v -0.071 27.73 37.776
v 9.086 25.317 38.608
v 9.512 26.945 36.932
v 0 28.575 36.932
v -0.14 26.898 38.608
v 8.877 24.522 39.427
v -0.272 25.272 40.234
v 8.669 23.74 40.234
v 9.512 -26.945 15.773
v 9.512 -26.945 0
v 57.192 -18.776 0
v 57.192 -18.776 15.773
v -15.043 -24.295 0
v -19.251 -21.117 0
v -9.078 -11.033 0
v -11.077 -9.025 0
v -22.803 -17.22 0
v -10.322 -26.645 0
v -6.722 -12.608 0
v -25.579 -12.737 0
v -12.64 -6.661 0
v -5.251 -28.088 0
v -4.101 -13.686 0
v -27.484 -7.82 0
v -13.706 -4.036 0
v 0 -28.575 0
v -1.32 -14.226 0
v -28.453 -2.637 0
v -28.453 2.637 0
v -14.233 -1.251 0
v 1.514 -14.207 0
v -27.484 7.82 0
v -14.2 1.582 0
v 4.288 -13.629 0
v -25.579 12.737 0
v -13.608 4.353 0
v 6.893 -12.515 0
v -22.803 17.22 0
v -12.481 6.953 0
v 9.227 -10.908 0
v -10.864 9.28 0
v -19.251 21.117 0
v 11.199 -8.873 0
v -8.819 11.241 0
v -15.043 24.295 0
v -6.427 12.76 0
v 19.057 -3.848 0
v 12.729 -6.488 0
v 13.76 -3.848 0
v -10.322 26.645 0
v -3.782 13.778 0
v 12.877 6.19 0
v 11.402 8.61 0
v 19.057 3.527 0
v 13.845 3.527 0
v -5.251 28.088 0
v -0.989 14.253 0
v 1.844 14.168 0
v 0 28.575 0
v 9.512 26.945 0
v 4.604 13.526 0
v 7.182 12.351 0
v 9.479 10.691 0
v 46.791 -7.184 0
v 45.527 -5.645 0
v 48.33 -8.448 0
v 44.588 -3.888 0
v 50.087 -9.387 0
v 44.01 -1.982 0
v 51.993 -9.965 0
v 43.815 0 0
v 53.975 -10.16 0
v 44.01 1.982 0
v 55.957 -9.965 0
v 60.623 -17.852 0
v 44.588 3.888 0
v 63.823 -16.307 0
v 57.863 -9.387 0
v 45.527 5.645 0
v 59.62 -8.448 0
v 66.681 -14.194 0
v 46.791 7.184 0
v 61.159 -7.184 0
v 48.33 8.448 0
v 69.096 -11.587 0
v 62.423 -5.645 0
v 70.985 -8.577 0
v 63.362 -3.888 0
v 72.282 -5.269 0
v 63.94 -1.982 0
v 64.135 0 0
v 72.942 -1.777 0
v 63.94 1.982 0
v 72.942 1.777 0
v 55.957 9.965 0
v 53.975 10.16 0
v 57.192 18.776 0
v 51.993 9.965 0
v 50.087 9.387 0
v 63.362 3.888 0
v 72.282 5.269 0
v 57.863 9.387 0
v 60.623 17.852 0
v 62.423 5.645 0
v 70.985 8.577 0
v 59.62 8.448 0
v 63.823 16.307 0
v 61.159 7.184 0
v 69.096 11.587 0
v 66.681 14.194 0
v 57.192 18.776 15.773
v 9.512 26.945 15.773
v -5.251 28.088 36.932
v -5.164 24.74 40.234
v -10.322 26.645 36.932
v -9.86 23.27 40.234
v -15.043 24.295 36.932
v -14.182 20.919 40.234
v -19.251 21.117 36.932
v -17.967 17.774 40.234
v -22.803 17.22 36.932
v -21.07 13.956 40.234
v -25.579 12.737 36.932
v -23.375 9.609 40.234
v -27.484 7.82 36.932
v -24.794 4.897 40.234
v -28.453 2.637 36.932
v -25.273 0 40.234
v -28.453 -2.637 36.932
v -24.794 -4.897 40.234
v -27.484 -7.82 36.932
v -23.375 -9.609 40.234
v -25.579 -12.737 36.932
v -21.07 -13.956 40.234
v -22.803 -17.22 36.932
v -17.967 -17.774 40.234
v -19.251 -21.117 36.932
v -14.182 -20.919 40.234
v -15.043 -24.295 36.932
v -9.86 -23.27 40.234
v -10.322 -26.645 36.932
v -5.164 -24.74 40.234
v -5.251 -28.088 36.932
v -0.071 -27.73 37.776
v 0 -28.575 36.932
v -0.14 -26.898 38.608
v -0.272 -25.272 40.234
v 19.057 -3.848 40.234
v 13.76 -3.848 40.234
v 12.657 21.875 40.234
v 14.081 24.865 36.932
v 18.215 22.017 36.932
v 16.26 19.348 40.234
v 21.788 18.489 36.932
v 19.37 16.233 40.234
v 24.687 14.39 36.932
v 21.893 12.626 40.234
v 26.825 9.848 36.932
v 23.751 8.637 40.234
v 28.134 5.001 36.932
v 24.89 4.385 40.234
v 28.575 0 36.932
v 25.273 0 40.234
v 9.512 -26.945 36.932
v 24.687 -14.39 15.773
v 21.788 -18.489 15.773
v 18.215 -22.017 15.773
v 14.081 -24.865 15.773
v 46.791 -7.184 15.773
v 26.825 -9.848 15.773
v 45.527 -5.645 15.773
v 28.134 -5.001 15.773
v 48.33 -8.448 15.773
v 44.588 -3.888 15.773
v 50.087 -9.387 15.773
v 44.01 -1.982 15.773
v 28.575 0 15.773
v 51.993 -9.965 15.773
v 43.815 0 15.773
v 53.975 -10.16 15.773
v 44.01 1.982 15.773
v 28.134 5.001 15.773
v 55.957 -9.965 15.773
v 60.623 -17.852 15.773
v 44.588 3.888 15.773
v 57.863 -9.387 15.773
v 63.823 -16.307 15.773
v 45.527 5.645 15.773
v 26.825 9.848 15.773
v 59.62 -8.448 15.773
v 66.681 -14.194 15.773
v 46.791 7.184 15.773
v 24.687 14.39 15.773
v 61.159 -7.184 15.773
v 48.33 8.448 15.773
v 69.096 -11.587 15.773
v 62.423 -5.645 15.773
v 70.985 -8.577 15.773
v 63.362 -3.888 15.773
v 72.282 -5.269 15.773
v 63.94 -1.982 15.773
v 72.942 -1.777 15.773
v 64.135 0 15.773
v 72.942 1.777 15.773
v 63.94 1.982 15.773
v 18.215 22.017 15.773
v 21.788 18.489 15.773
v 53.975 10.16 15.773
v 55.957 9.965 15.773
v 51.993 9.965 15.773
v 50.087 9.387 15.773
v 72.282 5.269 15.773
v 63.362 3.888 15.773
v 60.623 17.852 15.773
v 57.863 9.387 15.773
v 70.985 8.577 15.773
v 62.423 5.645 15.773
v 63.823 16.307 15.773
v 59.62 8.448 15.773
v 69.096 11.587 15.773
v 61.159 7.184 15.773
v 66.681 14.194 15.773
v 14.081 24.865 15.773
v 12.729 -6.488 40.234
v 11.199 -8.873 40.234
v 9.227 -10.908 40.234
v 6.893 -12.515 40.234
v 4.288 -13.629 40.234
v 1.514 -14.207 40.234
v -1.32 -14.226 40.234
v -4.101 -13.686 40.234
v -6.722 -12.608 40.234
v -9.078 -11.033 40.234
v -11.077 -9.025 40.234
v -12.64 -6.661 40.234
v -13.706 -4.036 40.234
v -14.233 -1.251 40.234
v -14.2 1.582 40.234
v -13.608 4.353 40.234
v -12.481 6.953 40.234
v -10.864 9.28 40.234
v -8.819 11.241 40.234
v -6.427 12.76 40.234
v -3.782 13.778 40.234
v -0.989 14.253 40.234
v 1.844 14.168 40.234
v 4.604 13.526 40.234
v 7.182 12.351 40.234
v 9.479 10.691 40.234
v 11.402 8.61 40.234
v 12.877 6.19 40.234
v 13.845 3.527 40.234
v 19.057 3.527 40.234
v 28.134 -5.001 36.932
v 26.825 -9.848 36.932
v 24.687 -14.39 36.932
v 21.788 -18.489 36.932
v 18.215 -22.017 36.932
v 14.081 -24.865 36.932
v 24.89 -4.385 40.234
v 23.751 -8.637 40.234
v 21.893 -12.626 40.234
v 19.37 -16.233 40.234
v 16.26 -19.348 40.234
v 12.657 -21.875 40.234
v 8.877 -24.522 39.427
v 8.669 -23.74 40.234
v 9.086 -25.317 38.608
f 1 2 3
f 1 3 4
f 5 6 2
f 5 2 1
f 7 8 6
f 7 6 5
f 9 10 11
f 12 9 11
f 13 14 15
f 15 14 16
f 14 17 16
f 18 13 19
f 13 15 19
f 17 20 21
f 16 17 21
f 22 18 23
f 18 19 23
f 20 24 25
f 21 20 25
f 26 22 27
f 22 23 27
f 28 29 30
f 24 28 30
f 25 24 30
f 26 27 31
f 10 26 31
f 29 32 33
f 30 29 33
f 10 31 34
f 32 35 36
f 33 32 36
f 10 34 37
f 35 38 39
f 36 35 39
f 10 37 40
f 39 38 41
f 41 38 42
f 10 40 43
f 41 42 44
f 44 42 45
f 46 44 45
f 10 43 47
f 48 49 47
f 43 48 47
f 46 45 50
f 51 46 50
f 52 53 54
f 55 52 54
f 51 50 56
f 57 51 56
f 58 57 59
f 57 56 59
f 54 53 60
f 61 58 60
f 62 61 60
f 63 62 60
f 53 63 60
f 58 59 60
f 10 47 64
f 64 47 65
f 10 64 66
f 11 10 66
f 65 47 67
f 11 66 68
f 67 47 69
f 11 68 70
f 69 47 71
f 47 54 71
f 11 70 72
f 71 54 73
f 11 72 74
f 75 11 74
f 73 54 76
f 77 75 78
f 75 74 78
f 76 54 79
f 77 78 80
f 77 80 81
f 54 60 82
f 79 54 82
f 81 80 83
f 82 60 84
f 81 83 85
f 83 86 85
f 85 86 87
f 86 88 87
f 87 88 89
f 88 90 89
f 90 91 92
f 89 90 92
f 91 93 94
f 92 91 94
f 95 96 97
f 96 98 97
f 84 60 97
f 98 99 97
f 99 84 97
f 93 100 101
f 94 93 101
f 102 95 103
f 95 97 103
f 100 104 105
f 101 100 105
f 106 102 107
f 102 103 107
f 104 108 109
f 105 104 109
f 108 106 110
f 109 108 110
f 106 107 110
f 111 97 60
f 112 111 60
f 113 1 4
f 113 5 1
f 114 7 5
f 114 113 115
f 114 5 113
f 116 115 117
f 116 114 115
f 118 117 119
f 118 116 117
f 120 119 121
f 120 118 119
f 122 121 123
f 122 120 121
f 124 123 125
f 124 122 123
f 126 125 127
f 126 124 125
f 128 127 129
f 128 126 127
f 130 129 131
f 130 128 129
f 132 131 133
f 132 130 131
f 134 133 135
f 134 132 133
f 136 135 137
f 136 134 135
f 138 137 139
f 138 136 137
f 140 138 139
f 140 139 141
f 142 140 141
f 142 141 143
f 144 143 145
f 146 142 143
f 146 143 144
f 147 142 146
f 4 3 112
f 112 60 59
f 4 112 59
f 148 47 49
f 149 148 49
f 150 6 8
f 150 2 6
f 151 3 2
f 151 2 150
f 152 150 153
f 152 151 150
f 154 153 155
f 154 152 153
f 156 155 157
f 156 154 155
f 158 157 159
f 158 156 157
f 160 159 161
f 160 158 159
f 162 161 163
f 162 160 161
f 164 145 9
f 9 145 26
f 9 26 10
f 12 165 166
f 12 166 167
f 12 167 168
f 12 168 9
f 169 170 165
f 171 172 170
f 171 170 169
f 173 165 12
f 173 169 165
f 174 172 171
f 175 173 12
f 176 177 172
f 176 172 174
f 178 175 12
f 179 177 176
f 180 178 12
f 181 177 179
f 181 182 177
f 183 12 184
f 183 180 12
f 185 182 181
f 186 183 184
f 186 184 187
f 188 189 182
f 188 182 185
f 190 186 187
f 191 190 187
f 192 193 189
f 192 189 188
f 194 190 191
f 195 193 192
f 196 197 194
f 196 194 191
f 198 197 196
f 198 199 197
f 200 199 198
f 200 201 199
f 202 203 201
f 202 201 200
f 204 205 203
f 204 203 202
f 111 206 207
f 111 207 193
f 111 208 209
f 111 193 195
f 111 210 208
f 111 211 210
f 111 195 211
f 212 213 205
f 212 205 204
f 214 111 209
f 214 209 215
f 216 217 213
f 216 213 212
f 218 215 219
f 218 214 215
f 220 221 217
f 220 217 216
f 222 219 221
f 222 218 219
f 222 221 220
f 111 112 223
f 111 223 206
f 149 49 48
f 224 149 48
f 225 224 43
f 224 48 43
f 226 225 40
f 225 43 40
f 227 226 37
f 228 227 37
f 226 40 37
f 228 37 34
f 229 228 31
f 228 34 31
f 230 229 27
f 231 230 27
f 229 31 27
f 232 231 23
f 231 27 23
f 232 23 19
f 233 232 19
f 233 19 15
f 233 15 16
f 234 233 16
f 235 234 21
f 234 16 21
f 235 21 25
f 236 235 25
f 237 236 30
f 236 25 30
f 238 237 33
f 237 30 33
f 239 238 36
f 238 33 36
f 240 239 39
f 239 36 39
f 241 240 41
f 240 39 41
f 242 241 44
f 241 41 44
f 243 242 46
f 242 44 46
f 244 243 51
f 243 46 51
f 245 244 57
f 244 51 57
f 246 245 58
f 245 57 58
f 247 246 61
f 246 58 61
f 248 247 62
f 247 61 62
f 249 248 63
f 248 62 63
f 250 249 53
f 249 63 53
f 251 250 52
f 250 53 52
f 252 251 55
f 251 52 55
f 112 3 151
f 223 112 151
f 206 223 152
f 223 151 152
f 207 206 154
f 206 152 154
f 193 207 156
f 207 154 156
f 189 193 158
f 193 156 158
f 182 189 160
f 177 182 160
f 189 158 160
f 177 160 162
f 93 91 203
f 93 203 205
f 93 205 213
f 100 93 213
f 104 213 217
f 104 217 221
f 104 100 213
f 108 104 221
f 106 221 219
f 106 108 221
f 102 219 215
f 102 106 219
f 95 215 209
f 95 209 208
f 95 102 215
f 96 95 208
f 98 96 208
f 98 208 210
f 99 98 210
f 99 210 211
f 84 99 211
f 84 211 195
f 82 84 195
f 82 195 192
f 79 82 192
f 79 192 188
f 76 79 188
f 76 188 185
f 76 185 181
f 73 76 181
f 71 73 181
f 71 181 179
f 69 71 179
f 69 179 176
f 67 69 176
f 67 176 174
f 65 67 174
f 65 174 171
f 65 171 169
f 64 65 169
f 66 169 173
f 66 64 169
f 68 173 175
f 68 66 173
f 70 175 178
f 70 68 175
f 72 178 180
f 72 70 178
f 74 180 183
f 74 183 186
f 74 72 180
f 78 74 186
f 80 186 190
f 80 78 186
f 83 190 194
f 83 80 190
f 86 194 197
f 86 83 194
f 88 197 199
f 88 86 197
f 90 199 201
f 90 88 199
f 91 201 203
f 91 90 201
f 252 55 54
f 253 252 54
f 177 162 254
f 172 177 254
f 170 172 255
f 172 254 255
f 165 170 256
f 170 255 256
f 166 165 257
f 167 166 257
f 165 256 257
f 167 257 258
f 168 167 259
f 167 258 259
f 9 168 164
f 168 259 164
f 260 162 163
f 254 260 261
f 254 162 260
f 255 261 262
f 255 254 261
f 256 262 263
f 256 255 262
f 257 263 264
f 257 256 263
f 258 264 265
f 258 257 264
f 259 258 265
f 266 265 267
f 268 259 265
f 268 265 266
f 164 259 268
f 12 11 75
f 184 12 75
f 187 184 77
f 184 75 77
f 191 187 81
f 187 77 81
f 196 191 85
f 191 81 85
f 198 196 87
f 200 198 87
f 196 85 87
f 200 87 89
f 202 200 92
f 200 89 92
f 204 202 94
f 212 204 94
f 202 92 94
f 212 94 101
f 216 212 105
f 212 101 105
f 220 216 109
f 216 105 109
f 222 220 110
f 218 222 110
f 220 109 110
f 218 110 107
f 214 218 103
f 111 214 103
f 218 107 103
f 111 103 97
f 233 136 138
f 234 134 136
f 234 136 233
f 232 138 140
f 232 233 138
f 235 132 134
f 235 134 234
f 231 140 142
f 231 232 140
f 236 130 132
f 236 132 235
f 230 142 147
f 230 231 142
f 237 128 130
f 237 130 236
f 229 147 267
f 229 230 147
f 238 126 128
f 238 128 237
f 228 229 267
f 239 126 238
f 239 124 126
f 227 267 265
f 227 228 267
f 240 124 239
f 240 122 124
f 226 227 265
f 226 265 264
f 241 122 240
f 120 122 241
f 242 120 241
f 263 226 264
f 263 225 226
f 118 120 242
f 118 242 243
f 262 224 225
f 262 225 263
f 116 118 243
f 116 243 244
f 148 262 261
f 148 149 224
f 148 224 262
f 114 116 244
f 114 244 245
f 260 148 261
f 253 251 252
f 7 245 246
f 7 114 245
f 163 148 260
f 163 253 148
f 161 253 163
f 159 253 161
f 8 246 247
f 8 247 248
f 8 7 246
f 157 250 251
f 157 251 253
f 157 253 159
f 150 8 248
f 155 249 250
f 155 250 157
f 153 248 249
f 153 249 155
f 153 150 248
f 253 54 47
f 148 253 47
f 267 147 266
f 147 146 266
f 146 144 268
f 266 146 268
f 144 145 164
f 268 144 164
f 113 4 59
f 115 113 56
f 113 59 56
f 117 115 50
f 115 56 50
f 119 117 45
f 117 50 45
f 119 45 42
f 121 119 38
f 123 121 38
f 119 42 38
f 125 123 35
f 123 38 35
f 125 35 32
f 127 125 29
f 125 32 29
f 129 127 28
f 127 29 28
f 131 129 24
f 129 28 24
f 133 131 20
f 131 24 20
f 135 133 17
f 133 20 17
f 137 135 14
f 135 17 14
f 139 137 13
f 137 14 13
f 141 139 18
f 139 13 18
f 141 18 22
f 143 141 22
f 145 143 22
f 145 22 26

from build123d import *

# Parameters (mm, degrees)
F0_R       = 10.16
F1_DEPTH   = 40.2336
F2_R       = 10.16
F3_DEPTH   = 24.4602
F4_C1_SIZE = 3.302
F4_C2_SIZE = 3.302
F4_C3_SIZE = 3.302
F4_C4_SIZE = 3.302


with BuildPart() as f1:
    # F0 (on Top) → F1 (new body)
    with BuildSketch(Plane.XY):
        with BuildLine():
            Line((57.1919272622, 18.7764181619), (9.5121844836, 26.9452959039))
            ThreePointArc((9.5121844836, 26.9452959039), (23.3274655355, 16.5033322905), (28.575, 0))
            ThreePointArc((28.575, 0), (23.3274655355, -16.5033322905), (9.5121844836, -26.9452959039))
            Line((9.5121844836, -26.9452959039), (57.1919272622, -18.7764181619))
            ThreePointArc((57.1919272622, -18.7764181619), (73.025, 0), (57.1919272622, 18.7764181619))
        make_face()
        with Locations((53.975, 0)):
            Circle(F0_R, mode=Mode.SUBTRACT)
        with BuildLine():
            Line((9.5121844836, 26.9452959039), (0, 28.575))
            ThreePointArc((0, 28.575), (-28.575, 0), (0, -28.575))
            Line((0, -28.575), (9.5121844836, -26.9452959039))
            ThreePointArc((9.5121844836, -26.9452959039), (23.3274655355, -16.5033322905), (28.575, 0))
            ThreePointArc((28.575, 0), (23.3274655355, 16.5033322905), (9.5121844836, 26.9452959039))
        make_face()
        with BuildLine():
            ThreePointArc((13.7595011415, -3.8482183654), (-14.2865339733, 0.1661423458), (13.845272005, 3.5271942616))
            Line((13.845272005, 3.5271942616), (19.0572988585, 3.5271942616))
            Line((19.0572988585, 3.5271942616), (19.0572988585, -3.8482183654))
            Line((19.0572988585, -3.8482183654), (13.7595011415, -3.8482183654))
        make_face(mode=Mode.SUBTRACT)
    extrude(amount=F1_DEPTH)

    # F2 (on face) → F3 (cut)
    with BuildSketch(Plane.XY.offset(40.2336)):
        with BuildLine():
            Line((57.1919272622, 18.7764181619), (9.5121844836, 26.9452959039))
            ThreePointArc((9.5121844836, 26.9452959039), (23.3274655355, 16.5033322905), (28.575, 0))
            ThreePointArc((28.575, 0), (23.3274655355, -16.5033322905), (9.5121844836, -26.9452959039))
            Line((9.5121844836, -26.9452959039), (57.1919272622, -18.7764181619))
            ThreePointArc((57.1919272622, -18.7764181619), (73.025, 0), (57.1919272622, 18.7764181619))
        make_face()
        with Locations((53.975, 0)):
            Circle(F2_R, mode=Mode.SUBTRACT)
    extrude(amount=-F3_DEPTH, mode=Mode.SUBTRACT)

    # F4: chamfer of 3.302 on 4 edges, made by hand

    # F4_c1
    f4_c1_edges = [f1.edges().sort_by_distance(p)[0] for p in [
        (4.7560922418, 27.760147952, 40.2336),
    ]]
    chamfer(f4_c1_edges, length=F4_C1_SIZE)

    # F4_c2
    f4_c2_edges = [f1.edges().sort_by_distance(p)[0] for p in [
        (4.7560922418, -27.760147952, 40.2336),
    ]]
    chamfer(f4_c2_edges, length=F4_C2_SIZE)

    # F4_c3
    f4_c3_edges = [f1.edges().sort_by_distance(p)[0] for p in [
        (-28.575, 0, 40.2336),
    ]]
    chamfer(f4_c3_edges, length=F4_C3_SIZE)

    # F4_c4
    f4_c4_edges = [f1.edges().sort_by_distance(p)[0] for p in [
        (28.575, 0, 40.2336),
    ]]
    chamfer(f4_c4_edges, length=F4_C4_SIZE)


solid = f1.part
